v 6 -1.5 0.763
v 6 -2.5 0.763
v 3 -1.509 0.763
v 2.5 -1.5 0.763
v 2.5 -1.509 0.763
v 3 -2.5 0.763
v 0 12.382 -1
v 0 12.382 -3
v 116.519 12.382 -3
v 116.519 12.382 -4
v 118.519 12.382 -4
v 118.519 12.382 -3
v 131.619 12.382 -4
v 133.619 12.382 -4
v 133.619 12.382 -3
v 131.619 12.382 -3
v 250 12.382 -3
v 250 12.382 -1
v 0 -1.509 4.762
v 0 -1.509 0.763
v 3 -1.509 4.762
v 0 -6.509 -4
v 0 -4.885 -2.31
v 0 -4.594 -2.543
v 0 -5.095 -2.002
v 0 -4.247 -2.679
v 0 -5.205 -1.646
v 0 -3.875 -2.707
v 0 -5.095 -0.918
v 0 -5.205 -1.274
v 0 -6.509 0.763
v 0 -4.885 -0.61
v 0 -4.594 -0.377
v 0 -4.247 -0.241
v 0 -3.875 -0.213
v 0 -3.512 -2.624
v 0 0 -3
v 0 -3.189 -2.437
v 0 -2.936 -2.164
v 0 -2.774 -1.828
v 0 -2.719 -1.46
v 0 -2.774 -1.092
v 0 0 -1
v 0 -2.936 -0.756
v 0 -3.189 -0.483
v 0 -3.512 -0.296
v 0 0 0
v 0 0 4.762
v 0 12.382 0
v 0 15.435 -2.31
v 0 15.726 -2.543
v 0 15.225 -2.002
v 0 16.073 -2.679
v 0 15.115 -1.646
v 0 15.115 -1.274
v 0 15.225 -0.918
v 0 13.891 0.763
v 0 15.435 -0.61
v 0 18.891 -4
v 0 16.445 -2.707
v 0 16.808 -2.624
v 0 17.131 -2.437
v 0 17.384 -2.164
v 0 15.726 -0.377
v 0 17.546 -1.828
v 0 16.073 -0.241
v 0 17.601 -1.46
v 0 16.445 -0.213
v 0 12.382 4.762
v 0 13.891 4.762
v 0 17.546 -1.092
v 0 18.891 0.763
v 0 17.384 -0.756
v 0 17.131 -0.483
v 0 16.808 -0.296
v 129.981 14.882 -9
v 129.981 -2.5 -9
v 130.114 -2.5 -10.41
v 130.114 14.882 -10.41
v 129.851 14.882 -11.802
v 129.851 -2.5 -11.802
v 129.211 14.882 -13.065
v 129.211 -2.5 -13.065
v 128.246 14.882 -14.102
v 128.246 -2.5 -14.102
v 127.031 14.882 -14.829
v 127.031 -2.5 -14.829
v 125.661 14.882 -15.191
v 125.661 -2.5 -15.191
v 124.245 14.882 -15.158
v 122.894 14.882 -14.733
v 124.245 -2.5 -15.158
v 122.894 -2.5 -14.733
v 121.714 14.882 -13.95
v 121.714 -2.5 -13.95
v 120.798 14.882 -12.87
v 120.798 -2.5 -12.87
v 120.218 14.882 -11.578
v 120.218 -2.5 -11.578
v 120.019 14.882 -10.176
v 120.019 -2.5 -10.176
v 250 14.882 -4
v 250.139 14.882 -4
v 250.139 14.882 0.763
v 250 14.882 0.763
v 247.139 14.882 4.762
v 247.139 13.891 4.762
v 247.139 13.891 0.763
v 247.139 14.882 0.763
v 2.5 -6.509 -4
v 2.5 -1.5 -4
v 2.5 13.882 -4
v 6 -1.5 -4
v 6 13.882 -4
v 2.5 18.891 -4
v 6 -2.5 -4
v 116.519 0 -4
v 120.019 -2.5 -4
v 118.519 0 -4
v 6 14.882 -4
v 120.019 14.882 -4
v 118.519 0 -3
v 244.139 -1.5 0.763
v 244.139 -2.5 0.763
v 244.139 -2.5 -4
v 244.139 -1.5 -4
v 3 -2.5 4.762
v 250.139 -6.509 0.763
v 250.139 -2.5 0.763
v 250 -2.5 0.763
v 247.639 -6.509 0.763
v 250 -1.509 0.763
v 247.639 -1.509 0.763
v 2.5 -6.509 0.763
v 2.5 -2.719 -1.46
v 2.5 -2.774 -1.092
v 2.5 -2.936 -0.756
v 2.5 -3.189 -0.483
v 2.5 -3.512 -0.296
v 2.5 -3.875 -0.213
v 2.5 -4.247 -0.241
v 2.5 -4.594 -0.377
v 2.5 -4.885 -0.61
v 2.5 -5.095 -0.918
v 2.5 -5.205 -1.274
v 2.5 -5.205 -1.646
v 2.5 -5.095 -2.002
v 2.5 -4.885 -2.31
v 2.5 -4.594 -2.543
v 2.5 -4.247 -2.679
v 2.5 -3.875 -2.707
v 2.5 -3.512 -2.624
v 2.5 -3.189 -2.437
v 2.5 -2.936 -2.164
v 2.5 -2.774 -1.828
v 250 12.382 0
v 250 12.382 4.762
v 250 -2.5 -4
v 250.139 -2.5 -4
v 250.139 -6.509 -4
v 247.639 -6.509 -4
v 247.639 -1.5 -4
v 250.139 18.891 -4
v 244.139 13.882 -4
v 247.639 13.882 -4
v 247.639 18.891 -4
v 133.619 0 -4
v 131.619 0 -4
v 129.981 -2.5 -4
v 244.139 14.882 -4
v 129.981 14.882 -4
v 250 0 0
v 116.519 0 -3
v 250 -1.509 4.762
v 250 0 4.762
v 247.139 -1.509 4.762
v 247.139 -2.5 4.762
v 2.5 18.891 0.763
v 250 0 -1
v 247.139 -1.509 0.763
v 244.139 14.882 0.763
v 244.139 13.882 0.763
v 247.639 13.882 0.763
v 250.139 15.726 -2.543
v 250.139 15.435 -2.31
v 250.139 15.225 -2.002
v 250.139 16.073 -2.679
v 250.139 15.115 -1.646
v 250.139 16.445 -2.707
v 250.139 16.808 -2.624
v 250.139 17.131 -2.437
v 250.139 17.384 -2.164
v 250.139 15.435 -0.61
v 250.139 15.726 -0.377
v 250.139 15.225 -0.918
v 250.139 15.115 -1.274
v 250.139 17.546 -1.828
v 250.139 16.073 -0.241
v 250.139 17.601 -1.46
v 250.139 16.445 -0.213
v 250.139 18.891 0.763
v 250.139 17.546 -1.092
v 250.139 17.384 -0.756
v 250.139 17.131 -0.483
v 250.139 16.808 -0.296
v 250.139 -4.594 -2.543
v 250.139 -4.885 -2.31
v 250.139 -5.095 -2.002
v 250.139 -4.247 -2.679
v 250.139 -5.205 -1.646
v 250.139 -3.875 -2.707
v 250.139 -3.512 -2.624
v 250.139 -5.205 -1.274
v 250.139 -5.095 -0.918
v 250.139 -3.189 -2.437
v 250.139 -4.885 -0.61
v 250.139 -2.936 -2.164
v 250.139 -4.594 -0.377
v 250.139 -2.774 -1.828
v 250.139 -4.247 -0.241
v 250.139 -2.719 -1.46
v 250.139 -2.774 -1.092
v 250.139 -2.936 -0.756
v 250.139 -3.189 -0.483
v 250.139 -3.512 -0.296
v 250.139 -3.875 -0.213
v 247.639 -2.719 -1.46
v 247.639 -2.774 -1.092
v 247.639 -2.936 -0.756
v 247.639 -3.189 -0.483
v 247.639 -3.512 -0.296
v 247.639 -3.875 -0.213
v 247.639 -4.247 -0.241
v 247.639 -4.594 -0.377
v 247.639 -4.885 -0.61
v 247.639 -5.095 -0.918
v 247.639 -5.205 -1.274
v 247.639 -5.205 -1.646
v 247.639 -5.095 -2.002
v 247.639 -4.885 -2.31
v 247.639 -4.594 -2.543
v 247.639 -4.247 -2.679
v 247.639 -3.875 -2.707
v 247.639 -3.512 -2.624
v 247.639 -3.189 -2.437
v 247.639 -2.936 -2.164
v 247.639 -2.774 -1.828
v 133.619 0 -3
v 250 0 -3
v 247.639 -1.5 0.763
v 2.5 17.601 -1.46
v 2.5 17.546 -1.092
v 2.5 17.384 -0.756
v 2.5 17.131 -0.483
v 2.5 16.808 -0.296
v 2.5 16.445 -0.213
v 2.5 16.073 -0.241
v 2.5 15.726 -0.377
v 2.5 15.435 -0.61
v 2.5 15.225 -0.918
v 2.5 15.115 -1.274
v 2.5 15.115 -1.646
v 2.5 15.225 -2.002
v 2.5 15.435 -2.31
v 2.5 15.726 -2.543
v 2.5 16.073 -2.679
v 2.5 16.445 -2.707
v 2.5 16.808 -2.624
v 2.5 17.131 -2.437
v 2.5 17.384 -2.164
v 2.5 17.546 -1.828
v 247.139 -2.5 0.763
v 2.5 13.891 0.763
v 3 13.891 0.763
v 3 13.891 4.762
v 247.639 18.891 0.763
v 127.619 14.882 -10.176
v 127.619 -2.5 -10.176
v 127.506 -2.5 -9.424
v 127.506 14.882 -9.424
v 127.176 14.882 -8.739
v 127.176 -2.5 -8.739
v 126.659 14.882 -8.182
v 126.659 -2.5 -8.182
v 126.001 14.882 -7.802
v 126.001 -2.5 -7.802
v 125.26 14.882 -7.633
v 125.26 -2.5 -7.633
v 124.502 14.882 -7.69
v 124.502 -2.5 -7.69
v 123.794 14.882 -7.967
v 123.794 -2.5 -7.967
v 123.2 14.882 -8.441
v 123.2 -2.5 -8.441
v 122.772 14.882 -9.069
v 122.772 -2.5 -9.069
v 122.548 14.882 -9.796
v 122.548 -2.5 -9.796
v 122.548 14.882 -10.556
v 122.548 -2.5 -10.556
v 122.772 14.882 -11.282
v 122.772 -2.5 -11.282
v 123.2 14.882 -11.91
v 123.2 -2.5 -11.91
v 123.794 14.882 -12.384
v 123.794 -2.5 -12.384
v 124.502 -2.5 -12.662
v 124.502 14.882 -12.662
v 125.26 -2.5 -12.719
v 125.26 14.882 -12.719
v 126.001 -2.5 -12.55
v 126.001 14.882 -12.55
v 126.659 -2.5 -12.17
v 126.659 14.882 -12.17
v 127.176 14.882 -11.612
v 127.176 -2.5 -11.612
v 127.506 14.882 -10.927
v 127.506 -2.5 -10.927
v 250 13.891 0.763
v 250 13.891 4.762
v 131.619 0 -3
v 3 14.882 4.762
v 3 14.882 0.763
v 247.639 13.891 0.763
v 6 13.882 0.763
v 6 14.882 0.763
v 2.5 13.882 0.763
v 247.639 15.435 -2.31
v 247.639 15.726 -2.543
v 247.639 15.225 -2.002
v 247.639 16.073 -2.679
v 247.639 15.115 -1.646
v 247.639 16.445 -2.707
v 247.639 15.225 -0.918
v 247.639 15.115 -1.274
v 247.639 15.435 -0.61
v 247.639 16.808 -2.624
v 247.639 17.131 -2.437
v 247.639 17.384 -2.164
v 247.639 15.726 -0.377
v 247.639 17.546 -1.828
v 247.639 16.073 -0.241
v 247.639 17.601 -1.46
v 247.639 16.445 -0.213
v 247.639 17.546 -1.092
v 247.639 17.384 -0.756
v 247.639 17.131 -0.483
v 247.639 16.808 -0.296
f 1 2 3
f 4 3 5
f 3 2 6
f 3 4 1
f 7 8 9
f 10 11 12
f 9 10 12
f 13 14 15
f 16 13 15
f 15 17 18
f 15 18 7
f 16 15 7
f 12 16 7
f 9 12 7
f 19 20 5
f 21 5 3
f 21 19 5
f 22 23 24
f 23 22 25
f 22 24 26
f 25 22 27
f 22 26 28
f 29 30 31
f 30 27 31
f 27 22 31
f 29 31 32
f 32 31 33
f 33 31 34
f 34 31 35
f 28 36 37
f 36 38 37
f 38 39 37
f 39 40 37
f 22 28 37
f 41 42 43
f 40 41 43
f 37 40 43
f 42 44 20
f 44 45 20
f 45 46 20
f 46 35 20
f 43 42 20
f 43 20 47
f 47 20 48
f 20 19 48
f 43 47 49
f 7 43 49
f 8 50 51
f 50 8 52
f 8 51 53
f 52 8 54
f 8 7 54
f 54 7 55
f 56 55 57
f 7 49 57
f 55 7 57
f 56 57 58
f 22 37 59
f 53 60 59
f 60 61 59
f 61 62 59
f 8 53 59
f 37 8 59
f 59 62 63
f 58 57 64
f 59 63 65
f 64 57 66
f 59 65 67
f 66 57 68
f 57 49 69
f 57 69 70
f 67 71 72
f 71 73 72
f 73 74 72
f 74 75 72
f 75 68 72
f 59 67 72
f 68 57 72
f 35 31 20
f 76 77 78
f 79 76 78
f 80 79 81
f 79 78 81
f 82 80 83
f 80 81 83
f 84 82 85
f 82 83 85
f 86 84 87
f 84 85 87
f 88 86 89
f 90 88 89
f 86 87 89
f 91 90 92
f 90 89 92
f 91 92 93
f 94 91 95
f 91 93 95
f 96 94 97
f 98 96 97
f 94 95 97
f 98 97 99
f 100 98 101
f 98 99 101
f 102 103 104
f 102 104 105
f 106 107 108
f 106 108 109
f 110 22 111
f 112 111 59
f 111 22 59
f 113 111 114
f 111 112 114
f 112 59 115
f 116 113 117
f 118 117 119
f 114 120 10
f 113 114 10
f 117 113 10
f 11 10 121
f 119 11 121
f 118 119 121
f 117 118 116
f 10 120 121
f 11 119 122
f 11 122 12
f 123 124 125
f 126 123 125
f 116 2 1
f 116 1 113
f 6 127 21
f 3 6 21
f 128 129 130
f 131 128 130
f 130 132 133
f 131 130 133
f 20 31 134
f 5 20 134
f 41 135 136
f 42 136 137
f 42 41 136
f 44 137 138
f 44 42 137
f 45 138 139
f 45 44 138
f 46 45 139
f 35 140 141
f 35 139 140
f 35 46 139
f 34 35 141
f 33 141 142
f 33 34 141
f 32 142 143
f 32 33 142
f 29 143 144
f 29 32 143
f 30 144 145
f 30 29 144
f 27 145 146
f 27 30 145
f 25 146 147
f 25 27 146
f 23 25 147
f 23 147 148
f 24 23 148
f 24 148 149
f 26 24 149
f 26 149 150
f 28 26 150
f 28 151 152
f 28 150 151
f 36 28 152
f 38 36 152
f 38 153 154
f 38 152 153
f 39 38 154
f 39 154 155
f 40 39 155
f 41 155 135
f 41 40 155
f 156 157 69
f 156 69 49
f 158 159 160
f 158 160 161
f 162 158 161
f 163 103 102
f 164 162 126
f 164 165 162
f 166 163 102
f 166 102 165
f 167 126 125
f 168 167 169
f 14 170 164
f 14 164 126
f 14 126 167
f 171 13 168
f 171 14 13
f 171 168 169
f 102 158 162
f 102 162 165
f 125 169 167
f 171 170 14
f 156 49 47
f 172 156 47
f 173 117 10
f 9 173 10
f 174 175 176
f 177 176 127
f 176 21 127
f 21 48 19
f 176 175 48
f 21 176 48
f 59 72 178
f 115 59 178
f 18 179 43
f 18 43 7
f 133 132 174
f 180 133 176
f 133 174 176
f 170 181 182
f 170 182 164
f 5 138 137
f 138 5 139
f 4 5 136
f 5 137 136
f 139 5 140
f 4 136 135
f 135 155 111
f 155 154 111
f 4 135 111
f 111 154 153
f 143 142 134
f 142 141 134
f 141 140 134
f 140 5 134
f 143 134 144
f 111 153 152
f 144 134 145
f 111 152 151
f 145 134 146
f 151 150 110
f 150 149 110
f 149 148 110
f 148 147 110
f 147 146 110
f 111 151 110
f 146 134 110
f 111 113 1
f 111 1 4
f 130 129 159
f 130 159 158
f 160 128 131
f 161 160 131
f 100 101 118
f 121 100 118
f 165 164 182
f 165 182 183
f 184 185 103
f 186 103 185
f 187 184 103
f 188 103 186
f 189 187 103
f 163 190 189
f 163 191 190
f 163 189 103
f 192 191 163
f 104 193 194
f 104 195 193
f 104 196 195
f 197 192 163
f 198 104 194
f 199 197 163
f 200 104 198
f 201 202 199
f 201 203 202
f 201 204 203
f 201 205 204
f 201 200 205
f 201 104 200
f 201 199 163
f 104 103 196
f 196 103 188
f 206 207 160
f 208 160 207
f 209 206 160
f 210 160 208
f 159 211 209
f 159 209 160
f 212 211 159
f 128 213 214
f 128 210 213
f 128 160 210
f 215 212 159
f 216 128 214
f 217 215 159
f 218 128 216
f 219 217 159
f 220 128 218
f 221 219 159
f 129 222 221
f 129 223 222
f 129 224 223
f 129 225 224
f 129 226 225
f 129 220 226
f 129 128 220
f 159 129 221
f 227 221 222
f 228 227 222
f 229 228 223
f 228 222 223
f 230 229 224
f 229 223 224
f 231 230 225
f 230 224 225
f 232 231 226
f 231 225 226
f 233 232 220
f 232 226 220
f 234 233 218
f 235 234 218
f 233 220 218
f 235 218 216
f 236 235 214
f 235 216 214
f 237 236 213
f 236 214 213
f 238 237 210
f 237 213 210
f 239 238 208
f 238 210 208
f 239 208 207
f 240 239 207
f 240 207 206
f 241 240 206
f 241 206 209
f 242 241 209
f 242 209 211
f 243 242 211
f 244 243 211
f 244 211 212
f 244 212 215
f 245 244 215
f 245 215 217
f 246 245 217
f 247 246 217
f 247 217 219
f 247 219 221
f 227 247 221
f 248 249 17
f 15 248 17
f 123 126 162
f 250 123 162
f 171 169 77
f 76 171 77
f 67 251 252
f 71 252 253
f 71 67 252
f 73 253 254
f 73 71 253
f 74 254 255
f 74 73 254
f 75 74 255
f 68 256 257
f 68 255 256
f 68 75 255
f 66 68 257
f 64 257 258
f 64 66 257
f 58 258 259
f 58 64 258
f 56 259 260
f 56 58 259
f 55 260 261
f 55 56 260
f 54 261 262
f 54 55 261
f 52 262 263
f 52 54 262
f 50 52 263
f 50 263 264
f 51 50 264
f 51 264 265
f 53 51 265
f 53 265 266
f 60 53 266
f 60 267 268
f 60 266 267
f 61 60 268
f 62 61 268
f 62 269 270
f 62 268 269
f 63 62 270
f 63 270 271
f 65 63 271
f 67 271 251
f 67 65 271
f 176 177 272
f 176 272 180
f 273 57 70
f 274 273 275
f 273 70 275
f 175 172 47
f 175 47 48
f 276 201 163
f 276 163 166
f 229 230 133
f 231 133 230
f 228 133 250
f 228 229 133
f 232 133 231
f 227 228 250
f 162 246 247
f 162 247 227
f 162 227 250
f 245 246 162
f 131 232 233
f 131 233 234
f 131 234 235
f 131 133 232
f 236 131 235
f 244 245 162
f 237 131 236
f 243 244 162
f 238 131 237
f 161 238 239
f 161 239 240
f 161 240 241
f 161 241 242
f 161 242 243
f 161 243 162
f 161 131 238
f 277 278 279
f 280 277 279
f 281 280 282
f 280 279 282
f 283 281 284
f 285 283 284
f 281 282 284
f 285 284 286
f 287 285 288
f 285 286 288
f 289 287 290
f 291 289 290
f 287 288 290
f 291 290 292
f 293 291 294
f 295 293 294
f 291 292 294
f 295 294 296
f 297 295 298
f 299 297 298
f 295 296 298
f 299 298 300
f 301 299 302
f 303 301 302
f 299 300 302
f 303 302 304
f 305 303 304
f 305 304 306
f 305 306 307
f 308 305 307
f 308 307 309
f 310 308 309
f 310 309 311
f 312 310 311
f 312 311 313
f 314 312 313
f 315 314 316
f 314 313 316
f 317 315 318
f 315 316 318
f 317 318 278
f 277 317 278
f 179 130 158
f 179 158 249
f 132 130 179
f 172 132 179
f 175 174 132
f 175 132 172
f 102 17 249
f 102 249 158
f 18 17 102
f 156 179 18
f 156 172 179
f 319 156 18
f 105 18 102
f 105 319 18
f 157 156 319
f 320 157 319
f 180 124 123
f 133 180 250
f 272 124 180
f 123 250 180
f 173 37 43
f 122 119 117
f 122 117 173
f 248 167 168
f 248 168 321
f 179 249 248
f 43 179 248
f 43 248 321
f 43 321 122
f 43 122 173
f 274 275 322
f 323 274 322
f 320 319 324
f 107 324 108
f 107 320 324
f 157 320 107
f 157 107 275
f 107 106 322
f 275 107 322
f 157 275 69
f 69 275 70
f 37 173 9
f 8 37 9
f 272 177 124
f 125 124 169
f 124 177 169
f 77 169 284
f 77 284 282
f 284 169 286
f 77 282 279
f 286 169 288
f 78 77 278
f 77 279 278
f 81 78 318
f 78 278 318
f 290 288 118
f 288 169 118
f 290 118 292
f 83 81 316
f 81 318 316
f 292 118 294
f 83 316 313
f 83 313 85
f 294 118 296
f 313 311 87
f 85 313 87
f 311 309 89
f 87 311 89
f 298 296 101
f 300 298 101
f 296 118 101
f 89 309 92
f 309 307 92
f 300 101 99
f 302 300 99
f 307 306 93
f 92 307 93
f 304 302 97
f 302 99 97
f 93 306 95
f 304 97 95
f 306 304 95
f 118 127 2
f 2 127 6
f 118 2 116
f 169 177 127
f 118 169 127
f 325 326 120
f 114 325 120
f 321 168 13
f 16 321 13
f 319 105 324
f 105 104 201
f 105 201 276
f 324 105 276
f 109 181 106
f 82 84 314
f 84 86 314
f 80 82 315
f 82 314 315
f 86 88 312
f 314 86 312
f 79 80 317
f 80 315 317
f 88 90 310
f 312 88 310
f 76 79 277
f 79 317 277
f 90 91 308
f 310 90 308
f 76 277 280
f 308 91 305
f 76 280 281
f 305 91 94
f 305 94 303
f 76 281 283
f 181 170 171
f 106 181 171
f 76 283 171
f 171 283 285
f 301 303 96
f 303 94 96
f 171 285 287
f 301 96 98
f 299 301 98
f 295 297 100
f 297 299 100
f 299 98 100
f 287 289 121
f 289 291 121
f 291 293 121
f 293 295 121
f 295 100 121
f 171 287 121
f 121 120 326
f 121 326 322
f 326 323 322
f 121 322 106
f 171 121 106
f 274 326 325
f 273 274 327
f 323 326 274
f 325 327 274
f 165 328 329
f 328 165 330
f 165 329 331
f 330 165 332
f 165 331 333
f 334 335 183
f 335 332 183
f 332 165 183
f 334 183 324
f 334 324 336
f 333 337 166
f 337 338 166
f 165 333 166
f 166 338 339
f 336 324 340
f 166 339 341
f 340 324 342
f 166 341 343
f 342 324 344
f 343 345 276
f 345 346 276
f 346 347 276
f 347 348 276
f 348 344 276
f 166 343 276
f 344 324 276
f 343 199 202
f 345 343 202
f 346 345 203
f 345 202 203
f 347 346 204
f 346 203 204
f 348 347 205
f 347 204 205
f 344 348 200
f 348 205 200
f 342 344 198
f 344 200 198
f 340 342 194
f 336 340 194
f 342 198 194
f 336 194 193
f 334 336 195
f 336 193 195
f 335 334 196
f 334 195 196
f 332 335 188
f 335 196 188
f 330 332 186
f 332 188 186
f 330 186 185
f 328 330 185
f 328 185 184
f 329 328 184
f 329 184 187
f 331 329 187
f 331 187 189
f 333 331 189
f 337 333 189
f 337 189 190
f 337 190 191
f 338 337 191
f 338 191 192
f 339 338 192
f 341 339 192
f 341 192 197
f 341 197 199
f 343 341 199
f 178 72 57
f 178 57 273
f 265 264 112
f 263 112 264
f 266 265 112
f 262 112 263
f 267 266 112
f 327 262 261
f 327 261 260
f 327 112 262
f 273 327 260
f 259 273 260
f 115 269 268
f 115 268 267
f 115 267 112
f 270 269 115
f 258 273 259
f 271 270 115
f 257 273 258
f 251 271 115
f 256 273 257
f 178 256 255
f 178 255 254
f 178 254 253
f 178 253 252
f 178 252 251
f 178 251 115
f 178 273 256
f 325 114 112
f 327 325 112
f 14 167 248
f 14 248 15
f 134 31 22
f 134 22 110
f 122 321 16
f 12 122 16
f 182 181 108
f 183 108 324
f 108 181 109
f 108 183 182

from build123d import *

# Parameters (mm, degrees)
BOSS_EXTRUDE1_DEPTH     = 250
SKETCH3_R               = 2.55
BOSS_EXTRUDE2_DEPTH     = 17.3825
SKETCH8_W               = 12.3825
SKETCH8_H               = 2
CUT_EXTRUDE4_DEPTH      = 251
SKETCH9_W               = 2
SKETCH9_H               = 12.3825
CUT_EXTRUDE5_DEPTH      = 1
SKETCH10_W              = 2.5
SKETCH10_H              = 4.00875
BOSS_EXTRUDE3_DEPTH     = 8.7625
SKETCH11_R              = 1.25
CUT_EXTRUDE6_DEPTH      = 247.638802
SKETCH14_W              = 3
SKETCH14_H              = 5
CUT_EXTRUDE7_DEPTH      = 4
SKETCH15_W              = 3.5
SKETCH15_H              = 4.7625
CUT_EXTRUDE9_DEPTH      = 1
MIRROR8_COPY_1_SKETCH_W = 3.5
MIRROR8_COPY_1_SKETCH_H = 4.7625
MIRROR8_COPY_1_DEPTH    = 1


with BuildPart() as part:
    # Sketch1 → Boss-Extrude1 (new body)
    with BuildSketch(Plane.YZ):
        Polygon((0, 4.7625), (-2.5, 4.7625), (-2.5, -4), (14.8825, -4), (14.8825, 4.7625), (12.3825, 4.7625), (12.3825, 0), (0, 0), align=None)
    extrude(amount=BOSS_EXTRUDE1_DEPTH)

    # Sketch3 → Boss-Extrude2 (add)
    with BuildSketch(Plane.XZ.offset(2.5)):
        with BuildLine():
            Line((120.019401026, -4), (129.980598974, -4))
            Line((129.980598974, -4), (129.980598974, -9))
            ThreePointArc((129.980598974, -9), (125.66141047, -15.191034327), (120.019401026, -10.175854887))
            Line((120.019401026, -10.175854887), (120.019401026, -4))
        make_face()
        with Locations((125.069401026, -10.175854887)):
            Circle(SKETCH3_R, mode=Mode.SUBTRACT)
    extrude(amount=-BOSS_EXTRUDE2_DEPTH)

    # Sketch8 → Cut-Extrude4 (cut, through all)
    with BuildSketch(Plane.YZ.offset(250)):
        with Locations((6.19125, -2)):
            Rectangle(SKETCH8_W, SKETCH8_H)
    extrude(amount=-CUT_EXTRUDE4_DEPTH, mode=Mode.SUBTRACT)

    # Sketch9 → Cut-Extrude5 (cut)
    with BuildSketch(Plane(origin=(0, 0, -4), x_dir=(-1, 0, 0), z_dir=(0, 0, -1))):
        with Locations((-117.519401026, 6.19125)):
            Rectangle(SKETCH9_W, SKETCH9_H)
    cut_extrude5 = extrude(amount=-CUT_EXTRUDE5_DEPTH, mode=Mode.SUBTRACT)

    # Mirror1: Cut-Extrude5 across plane
    add(cut_extrude5.mirror(Plane.ZY.offset(-125.069401026)), mode=Mode.SUBTRACT)

    # Sketch10 → Boss-Extrude3 (add)
    with BuildSketch(Plane.XY.offset(4.7625)):
        with Locations((1.25, 16.886875)):
            Rectangle(SKETCH10_W, SKETCH10_H)
        with Locations((1.25, -4.504375)):
            Rectangle(SKETCH10_W, SKETCH10_H)
    boss_extrude3 = extrude(amount=-BOSS_EXTRUDE3_DEPTH)

    # Mirror2: Boss-Extrude3 across plane
    add(boss_extrude3.mirror(Plane.ZY.offset(-125.069401026)))

    # Sketch11 → Cut-Extrude6 (cut)
    with BuildSketch(Plane.YZ.offset(250.138802052)):
        with Locations((16.35125, -1.46)):
            Circle(SKETCH11_R)
        with Locations((-3.96875, -1.46)):
            Circle(SKETCH11_R)
    cut_extrude6 = extrude(amount=-CUT_EXTRUDE6_DEPTH, mode=Mode.SUBTRACT)

    # Mirror3: Cut-Extrude6 across plane
    add(cut_extrude6.mirror(Plane.ZY.offset(-125.069401026)), mode=Mode.SUBTRACT)

    # Sketch14 → Cut-Extrude7 (cut)
    with BuildSketch(Plane.XY.offset(4.7625)):
        with Locations((1.5, -4.00875)):
            Rectangle(SKETCH14_W, SKETCH14_H)
        with Locations((1.5, 16.39125)):
            Rectangle(SKETCH14_W, SKETCH14_H)
    cut_extrude7 = extrude(amount=-CUT_EXTRUDE7_DEPTH, mode=Mode.SUBTRACT)

    # Mirror4: Cut-Extrude7 across plane
    add(cut_extrude7.mirror(Plane.ZY.offset(-125.069401026)), mode=Mode.SUBTRACT)

    # Sketch15 → Cut-Extrude9 (cut)
    with BuildSketch(Plane(origin=(0, -2.5, 0), x_dir=(-1, 0, 0), z_dir=(0, -1, 0))):
        with Locations((-4.25, 1.61875)):
            Rectangle(SKETCH15_W, SKETCH15_H)
    cut_extrude9 = extrude(amount=-CUT_EXTRUDE9_DEPTH, mode=Mode.SUBTRACT)

    # Mirror7: Cut-Extrude9 across plane
    add(cut_extrude9.mirror(Plane.ZX.offset(6.19125)), mode=Mode.SUBTRACT)

    # Mirror8: Cut-Extrude9 across plane
    add(cut_extrude9.mirror(Plane.ZY.offset(-125.069401026)), mode=Mode.SUBTRACT)

    # Mirror8 copy 1 sketch → Mirror8 copy 1 (cut)
    with BuildSketch(Plane(origin=(250.138802052, 14.8825, 0), x_dir=(1, 0, 0), z_dir=(0, 1, 0))):
        with Locations((-4.25, 1.61875)):
            Rectangle(MIRROR8_COPY_1_SKETCH_W, MIRROR8_COPY_1_SKETCH_H)
    extrude(amount=-MIRROR8_COPY_1_DEPTH, mode=Mode.SUBTRACT)


solid = part.part
